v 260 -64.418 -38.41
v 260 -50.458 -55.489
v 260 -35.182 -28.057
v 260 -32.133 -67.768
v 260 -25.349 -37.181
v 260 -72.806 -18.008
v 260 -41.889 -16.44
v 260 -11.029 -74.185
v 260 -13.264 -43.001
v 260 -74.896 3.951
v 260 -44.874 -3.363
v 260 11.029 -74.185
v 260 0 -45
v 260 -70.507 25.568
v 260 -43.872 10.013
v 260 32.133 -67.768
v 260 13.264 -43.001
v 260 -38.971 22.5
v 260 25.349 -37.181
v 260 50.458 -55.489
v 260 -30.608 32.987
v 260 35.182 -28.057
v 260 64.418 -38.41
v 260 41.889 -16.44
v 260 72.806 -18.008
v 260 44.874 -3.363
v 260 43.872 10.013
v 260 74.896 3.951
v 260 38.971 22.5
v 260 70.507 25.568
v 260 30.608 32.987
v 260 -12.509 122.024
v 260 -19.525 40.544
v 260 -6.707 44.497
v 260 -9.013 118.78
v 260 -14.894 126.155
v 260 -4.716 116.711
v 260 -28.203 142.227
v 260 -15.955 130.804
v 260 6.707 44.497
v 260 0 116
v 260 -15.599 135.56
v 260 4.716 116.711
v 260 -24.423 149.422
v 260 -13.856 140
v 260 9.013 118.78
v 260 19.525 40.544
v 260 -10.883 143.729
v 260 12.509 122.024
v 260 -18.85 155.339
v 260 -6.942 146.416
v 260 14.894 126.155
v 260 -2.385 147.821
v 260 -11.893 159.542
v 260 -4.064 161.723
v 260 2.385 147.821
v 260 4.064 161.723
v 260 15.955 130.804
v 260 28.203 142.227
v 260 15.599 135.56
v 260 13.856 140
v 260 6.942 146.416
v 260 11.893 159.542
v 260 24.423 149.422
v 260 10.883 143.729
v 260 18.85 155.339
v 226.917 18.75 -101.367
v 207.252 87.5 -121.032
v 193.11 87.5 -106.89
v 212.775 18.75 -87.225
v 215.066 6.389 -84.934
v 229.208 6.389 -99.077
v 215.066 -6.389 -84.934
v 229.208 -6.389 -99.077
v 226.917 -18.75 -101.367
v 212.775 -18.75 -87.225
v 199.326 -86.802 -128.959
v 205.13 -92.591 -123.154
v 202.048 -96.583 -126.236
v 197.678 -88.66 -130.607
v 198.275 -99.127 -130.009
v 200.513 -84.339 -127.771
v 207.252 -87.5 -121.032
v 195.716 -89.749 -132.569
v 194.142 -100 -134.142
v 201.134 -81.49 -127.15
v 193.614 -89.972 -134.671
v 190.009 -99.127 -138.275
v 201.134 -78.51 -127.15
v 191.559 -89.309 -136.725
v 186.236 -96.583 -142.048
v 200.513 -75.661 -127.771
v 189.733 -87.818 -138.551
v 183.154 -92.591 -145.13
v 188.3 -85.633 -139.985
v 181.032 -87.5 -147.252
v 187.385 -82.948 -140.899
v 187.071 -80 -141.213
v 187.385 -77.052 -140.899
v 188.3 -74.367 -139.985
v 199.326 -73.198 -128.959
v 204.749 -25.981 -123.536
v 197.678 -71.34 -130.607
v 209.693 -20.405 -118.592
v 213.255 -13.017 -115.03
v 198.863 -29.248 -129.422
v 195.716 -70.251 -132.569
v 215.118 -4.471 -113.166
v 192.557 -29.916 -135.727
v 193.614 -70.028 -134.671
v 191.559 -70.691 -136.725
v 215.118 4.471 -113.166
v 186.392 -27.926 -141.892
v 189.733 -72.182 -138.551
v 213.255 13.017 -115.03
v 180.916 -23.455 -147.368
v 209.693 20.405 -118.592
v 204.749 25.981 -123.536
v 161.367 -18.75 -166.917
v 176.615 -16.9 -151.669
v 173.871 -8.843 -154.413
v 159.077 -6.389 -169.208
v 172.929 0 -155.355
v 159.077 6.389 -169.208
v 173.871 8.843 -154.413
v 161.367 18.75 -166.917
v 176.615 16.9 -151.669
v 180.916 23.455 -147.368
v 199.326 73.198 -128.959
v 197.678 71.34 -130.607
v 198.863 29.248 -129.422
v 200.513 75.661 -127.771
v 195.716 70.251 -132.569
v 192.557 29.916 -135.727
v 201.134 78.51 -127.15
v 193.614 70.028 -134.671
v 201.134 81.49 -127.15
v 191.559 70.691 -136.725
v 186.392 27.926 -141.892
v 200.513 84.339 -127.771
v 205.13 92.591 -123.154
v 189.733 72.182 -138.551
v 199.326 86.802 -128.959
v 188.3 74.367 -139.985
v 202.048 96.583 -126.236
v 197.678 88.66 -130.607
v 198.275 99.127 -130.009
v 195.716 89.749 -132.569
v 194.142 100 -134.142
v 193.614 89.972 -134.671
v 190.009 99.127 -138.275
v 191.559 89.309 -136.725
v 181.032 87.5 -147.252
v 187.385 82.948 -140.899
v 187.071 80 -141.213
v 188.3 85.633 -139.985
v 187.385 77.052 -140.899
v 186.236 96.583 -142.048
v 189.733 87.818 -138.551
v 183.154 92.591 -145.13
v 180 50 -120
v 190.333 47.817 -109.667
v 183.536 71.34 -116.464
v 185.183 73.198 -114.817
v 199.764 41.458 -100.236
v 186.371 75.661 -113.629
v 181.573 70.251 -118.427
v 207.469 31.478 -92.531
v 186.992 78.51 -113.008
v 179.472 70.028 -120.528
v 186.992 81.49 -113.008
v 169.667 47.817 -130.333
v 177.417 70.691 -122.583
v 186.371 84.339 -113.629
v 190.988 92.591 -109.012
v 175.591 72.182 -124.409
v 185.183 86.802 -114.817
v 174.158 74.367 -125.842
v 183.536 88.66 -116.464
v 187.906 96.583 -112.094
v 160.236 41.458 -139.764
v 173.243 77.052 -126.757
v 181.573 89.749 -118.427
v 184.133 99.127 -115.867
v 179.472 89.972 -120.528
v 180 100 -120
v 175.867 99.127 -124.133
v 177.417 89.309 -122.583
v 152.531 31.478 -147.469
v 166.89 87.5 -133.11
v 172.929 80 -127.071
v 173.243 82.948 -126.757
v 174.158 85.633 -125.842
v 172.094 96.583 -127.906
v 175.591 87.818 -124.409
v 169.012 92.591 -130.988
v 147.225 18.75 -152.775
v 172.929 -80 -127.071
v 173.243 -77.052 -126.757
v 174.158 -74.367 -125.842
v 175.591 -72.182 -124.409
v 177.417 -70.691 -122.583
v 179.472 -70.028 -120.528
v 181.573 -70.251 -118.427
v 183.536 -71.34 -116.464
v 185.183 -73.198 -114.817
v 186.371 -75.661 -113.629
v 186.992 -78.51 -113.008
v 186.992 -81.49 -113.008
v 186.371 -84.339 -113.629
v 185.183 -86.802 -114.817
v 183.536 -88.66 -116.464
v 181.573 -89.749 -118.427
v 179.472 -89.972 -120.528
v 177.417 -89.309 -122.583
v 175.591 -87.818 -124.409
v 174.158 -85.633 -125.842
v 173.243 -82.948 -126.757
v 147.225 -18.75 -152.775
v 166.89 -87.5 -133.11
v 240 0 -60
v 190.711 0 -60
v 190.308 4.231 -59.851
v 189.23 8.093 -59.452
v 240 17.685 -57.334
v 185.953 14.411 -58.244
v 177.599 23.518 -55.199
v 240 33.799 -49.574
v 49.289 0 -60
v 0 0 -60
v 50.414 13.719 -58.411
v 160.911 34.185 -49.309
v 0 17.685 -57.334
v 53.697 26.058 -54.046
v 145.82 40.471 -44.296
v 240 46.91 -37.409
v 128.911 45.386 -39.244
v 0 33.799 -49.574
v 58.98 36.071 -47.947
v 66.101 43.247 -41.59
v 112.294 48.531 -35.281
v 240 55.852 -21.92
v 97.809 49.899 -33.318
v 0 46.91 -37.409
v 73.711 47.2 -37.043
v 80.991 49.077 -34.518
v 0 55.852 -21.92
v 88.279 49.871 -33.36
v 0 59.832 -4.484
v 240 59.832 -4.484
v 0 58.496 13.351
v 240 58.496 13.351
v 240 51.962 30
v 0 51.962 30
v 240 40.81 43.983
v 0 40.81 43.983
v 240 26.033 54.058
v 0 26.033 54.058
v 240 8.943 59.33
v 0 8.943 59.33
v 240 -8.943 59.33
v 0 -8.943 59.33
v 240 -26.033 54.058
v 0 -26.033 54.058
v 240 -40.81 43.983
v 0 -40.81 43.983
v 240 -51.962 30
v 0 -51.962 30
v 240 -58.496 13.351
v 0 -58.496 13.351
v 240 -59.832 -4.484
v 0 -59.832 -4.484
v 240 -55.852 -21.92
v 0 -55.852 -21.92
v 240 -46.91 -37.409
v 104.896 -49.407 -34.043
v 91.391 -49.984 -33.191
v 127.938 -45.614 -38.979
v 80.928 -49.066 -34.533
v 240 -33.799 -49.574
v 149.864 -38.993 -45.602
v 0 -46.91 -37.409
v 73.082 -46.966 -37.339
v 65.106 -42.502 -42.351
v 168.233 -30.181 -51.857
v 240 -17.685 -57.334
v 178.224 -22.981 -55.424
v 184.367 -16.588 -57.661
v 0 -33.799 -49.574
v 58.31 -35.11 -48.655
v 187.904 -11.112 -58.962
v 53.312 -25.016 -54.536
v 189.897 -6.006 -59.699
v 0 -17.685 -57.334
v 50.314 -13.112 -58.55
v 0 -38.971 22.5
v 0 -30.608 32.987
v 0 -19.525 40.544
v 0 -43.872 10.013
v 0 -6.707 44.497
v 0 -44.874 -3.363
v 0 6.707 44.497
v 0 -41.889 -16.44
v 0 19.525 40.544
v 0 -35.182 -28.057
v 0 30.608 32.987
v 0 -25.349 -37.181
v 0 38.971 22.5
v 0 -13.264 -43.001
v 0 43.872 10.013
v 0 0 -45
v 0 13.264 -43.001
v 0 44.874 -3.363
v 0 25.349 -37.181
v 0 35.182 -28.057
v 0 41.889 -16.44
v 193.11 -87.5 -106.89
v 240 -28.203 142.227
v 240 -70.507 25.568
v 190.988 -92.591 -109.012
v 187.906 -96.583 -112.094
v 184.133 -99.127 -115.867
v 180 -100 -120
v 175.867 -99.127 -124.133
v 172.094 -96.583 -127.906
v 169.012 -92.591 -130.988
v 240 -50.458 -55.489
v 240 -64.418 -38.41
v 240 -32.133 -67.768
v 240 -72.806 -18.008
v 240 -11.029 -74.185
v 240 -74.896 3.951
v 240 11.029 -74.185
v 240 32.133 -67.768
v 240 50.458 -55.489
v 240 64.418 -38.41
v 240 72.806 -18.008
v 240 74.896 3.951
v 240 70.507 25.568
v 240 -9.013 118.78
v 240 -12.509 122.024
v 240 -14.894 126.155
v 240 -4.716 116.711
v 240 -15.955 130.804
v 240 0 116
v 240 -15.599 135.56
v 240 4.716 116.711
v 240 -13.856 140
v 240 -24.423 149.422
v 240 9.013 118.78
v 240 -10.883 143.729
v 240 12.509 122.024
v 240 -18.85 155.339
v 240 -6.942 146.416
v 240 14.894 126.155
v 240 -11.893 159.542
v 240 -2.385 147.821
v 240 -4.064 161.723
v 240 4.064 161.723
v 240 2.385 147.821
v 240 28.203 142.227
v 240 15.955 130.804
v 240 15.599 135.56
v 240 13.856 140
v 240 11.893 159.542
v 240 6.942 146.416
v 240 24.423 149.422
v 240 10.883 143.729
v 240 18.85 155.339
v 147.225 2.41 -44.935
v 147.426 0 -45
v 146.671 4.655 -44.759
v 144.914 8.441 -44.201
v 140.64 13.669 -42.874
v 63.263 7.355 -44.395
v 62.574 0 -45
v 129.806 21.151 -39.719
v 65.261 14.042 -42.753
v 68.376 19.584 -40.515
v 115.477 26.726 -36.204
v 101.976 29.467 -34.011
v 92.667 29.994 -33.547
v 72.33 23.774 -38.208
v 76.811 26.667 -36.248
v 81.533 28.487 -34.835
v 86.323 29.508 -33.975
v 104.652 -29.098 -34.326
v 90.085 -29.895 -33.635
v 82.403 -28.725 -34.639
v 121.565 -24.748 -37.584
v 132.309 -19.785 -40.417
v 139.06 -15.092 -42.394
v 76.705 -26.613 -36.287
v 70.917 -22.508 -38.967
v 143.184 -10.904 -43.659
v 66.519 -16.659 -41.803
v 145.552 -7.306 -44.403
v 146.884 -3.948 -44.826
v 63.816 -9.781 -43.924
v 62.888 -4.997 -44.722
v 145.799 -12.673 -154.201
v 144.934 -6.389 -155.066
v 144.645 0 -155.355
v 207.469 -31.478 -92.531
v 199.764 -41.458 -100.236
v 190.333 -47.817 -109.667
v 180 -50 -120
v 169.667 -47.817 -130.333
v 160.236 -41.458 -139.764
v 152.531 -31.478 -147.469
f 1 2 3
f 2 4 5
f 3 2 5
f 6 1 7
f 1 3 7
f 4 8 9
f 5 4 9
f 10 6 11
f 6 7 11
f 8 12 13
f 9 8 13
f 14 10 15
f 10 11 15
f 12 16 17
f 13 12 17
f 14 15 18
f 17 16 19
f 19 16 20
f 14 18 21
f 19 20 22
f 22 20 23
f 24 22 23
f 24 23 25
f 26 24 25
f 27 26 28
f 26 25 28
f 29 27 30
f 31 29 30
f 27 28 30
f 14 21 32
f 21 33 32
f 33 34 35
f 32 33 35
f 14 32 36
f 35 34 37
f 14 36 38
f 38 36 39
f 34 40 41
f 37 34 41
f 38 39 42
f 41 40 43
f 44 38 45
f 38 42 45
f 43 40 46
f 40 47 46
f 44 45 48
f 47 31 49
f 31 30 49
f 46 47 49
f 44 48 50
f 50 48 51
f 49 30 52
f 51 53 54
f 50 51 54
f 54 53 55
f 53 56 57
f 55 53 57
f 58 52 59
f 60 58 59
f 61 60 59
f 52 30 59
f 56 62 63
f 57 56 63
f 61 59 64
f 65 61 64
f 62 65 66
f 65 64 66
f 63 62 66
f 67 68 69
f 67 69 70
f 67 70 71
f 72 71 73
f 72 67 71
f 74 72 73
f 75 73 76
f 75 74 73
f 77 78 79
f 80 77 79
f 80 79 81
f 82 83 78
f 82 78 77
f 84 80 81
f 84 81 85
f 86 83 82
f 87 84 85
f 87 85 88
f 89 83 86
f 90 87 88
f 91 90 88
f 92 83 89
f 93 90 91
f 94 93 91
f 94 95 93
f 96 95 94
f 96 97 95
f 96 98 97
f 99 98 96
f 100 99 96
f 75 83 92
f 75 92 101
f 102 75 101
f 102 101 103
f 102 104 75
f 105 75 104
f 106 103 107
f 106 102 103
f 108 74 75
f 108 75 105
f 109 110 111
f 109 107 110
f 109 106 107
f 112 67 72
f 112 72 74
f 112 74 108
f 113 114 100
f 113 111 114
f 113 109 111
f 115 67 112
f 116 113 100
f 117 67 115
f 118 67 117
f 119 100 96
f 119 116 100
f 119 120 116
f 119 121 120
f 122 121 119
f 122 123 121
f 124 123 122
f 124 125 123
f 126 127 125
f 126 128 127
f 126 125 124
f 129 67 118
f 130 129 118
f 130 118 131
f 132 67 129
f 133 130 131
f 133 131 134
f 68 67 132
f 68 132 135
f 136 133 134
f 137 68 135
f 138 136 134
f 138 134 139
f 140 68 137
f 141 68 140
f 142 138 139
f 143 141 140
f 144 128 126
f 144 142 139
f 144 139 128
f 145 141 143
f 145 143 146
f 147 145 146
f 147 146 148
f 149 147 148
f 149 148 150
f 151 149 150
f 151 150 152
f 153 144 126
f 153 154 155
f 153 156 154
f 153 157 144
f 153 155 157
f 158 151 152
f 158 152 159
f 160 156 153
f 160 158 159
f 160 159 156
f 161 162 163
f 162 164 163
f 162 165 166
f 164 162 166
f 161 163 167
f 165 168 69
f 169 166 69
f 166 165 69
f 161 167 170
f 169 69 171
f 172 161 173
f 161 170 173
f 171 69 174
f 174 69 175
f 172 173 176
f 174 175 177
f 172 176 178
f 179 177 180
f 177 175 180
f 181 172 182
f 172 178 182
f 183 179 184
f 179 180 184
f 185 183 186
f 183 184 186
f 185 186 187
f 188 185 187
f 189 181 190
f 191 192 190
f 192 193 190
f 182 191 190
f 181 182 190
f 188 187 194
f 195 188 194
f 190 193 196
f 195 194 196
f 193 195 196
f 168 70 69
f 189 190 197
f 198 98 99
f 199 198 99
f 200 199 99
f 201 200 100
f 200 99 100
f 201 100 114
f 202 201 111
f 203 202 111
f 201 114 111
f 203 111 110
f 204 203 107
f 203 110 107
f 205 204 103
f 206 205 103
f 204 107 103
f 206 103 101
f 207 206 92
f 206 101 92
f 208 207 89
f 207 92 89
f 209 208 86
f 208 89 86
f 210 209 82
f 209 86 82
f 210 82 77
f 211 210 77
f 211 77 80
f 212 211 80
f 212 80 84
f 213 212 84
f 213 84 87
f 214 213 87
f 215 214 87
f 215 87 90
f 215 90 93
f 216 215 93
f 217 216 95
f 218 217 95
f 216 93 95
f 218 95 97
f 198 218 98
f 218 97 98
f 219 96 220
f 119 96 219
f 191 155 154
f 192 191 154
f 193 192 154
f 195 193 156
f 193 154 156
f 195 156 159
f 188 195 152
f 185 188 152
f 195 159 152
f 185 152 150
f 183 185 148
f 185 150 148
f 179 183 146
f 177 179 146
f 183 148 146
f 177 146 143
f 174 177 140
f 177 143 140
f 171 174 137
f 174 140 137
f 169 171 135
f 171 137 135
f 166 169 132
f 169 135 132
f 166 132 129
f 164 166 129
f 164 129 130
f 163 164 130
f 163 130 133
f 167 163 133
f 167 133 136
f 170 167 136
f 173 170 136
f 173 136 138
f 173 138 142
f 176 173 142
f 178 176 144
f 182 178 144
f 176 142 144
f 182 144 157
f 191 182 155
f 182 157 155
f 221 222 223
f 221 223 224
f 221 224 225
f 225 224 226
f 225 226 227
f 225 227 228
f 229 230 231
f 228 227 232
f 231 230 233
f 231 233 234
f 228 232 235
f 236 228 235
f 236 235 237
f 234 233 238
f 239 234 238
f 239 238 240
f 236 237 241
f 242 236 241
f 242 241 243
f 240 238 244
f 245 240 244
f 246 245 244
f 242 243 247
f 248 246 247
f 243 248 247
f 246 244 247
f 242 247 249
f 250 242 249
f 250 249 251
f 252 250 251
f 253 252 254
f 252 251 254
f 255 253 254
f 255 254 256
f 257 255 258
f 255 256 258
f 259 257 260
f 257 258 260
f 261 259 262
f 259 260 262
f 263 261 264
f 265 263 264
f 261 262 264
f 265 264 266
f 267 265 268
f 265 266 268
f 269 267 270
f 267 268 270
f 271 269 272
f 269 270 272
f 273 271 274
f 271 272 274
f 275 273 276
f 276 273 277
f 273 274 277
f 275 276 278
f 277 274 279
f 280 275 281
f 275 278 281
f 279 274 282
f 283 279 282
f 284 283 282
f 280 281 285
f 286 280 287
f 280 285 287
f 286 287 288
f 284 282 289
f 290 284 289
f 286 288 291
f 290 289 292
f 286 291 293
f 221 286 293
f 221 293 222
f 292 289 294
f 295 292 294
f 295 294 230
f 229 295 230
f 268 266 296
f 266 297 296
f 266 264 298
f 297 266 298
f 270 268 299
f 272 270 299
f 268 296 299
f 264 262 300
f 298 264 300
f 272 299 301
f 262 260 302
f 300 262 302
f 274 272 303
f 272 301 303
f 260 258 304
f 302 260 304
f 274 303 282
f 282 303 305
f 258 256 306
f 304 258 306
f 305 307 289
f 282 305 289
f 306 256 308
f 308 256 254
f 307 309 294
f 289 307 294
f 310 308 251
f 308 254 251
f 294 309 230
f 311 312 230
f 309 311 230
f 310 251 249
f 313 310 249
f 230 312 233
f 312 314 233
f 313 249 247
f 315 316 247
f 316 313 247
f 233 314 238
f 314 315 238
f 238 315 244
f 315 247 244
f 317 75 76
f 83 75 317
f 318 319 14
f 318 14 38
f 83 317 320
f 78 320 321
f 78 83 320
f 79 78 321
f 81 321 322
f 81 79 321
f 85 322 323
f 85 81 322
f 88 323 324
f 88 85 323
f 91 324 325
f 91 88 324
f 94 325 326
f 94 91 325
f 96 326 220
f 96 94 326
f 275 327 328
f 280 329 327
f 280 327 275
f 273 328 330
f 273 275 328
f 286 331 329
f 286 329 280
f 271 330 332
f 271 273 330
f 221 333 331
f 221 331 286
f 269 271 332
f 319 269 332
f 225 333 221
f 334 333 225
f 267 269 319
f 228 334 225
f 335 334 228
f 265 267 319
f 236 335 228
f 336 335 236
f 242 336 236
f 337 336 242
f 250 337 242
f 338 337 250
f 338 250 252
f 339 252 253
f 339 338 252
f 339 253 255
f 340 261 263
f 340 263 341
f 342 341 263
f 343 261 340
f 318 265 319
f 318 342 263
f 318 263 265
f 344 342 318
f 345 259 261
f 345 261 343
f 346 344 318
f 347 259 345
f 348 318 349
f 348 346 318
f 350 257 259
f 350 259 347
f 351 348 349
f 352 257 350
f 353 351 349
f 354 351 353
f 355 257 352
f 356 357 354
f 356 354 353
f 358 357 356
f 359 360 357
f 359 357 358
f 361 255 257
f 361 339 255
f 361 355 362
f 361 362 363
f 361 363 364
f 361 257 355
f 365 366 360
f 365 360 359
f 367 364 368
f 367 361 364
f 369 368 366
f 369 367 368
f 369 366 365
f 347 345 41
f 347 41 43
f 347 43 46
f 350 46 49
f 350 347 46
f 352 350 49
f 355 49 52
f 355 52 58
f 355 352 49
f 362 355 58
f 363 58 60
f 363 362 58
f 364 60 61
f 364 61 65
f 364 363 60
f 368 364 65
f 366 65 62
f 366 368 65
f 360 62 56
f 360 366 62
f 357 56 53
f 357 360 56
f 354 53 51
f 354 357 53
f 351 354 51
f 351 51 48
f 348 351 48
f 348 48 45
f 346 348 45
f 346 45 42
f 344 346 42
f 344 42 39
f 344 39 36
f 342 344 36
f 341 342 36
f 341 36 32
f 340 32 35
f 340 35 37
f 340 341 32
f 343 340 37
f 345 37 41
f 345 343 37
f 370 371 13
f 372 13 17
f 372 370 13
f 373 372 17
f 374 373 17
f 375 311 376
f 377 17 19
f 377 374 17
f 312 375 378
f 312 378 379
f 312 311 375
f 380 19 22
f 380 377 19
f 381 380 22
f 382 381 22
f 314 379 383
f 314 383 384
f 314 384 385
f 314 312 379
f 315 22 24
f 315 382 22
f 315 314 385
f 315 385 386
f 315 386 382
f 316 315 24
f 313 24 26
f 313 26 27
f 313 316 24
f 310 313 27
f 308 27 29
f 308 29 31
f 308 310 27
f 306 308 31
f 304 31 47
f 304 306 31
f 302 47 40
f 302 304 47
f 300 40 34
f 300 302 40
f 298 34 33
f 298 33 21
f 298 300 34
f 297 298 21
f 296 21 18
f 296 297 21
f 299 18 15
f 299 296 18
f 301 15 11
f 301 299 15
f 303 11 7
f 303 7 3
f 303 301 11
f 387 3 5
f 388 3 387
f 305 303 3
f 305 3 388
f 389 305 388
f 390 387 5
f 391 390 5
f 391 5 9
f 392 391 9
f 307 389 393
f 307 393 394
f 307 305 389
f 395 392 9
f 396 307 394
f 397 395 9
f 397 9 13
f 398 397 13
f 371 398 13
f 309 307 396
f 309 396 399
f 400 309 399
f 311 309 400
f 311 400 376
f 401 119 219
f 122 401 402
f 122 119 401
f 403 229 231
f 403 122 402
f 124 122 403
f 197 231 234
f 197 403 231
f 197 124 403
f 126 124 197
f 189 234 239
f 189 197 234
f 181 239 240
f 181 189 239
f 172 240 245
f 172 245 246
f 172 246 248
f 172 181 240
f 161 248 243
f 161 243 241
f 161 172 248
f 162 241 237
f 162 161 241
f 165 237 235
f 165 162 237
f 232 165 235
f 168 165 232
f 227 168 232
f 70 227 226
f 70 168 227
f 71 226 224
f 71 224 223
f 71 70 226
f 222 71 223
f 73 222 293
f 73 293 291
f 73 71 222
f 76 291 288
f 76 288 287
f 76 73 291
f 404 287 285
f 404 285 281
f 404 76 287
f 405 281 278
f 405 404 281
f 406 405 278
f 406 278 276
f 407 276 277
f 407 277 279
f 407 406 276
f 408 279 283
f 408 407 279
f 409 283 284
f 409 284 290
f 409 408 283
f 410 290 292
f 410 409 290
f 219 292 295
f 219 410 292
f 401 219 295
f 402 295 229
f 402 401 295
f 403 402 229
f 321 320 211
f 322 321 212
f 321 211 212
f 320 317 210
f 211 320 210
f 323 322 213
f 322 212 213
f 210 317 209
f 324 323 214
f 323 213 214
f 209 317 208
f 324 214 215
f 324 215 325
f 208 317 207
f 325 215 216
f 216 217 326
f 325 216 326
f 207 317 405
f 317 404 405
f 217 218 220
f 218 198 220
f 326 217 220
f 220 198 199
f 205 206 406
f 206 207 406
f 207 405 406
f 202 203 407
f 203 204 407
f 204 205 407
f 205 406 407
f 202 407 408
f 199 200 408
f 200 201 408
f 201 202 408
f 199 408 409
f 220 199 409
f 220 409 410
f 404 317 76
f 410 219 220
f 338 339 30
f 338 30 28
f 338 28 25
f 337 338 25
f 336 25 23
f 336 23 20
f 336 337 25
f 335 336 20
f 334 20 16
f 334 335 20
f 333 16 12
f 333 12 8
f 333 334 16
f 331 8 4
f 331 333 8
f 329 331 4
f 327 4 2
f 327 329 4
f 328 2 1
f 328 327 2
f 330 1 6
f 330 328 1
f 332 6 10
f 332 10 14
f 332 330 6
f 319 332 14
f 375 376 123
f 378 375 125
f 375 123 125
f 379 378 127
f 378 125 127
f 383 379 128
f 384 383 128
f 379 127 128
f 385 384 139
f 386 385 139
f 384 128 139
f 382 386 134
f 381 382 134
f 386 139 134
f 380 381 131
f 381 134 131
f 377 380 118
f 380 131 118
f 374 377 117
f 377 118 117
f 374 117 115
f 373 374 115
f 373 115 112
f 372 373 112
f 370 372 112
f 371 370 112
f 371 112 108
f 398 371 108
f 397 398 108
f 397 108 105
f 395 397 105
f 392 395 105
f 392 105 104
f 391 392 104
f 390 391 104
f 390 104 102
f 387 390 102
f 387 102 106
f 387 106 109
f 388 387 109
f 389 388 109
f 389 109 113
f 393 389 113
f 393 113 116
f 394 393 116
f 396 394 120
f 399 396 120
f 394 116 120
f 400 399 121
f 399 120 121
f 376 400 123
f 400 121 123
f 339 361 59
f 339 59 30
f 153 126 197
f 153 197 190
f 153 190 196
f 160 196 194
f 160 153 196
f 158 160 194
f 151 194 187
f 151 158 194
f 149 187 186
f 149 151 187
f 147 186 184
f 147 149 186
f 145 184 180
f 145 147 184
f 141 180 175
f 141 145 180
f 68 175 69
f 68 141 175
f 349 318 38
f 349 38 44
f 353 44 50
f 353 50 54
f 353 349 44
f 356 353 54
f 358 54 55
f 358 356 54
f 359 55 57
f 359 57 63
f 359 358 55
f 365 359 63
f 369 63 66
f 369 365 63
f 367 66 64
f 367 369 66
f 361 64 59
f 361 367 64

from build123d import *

# Parameters (mm, degrees)
SKETCH_1_R           = 60
SKETCH_1_R_2         = 45
EXTRUDE_1_DEPTH      = 240
SKETCH_2_R           = 45
SKETCH_2_R_2         = 16
EXTRUDE_2_DEPTH      = 20
EXTRUDE_4_REACH      = 356.216
EXTRUDE_4_END_RADIUS = 60
SKETCH_15_R          = 50
SKETCH_15_R_2        = 30
CUT_EXTRUDE_1_REACH  = 356.216
SKETCH_18_R          = 30
EXTRUDE_START        = 20
SKETCH_19_R          = 30
SKETCH_19_R_2        = 10
EXTRUDE_6_DEPTH      = 20


with BuildPart() as part:
    # 草图1 → 凸台-拉伸1 (new body)
    with BuildSketch(Plane(origin=(0, 0, 0), x_dir=(0, 0, -1), z_dir=(1, 0, 0))):
        Circle(SKETCH_1_R)
        Circle(SKETCH_1_R_2, mode=Mode.SUBTRACT)
    extrude(amount=EXTRUDE_1_DEPTH)

    # 草图2 → 凸台-拉伸2 (add)
    with BuildSketch(Plane(origin=(240, 0, 0), x_dir=(0, 0, -1), z_dir=(1, 0, 0))):
        with BuildLine():
            Line((-142.227272727, 28.202888018), (-25.568181818, 70.507220045))
            ThreePointArc((-25.568181818, 70.507220045), (75, 0), (-25.568181818, -70.507220045))
            Line((-25.568181818, -70.507220045), (-142.227272727, -28.202888018))
            ThreePointArc((-142.227272727, -28.202888018), (-162, 0), (-142.227272727, 28.202888018))
        make_face()
        Circle(SKETCH_2_R, mode=Mode.SUBTRACT)
        with Locations((-132, 0)):
            Circle(SKETCH_2_R_2, mode=Mode.SUBTRACT)
    extrude(amount=EXTRUDE_2_DEPTH)

    # 凸台-拉伸4: up to this cylinder (the profile starts outside it)
    extrude_4_end = Plane(origin=(214.355339, 0, 0), z_dir=(-1, 0, 0)) * Cylinder(EXTRUDE_4_END_RADIUS, 833.432, mode=Mode.PRIVATE)
    # 草图15 → 凸台-拉伸4 (add, up to the surface)
    with BuildSketch(Plane(origin=(150, 0, -150), x_dir=(-0.7071067811865465, 2.3800392787790966e-15, -0.7071067811865487), z_dir=(0.7071067811865487, -2.3800392787791053e-15, -0.7071067811865465)), mode=Mode.PRIVATE) as extrude_4_sk1:
        with Locations((-42.426406871, 0)):
            Circle(SKETCH_15_R)
        with Locations((-42.426406871, 0)):
            Circle(SKETCH_15_R_2, mode=Mode.SUBTRACT)
    extrude_4_tool1 = extrude(extrude_4_sk1.sketch, amount=-EXTRUDE_4_REACH, mode=Mode.PRIVATE) - extrude_4_end
    add(extrude_4_tool1.solids().sort_by_distance((214.355339, 0, -85.644661))[0])

    # 草图18 → 切除-拉伸1 (cut, up to next)
    with BuildSketch(Plane(origin=(150, 0, -150), x_dir=(-0.7071067811865465, 2.3800392787790978e-15, -0.7071067811865486), z_dir=(0.7071067811865486, -2.380039278779105e-15, -0.7071067811865465)), mode=Mode.PRIVATE) as cut_extrude_1_sk1:
        with Locations((-42.426406871, 0)):
            Circle(SKETCH_18_R)
    cut_extrude_1_tool1 = extrude(cut_extrude_1_sk1.sketch, amount=-CUT_EXTRUDE_1_REACH, mode=Mode.PRIVATE) & part.part
    add(cut_extrude_1_tool1.solids().sort_by_distance((180, 0, -120))[0], mode=Mode.SUBTRACT)

    # 草图19 → 凸台-拉伸6 (add)
    with BuildSketch(Plane(origin=(150, 0, -150), x_dir=(-0.7071067811865465, 2.3800392787790978e-15, -0.7071067811865486), z_dir=(0.7071067811865486, -2.380039278779105e-15, -0.7071067811865465)).offset(EXTRUDE_START)):
        with BuildLine():
            Line((-60.966903089, 87.5), (-88.777647416, 18.75))
            ThreePointArc((-88.777647416, 18.75), (-92.426406871, 0), (-88.777647416, -18.75))
            Line((-88.777647416, -18.75), (-60.966903089, -87.5))
            ThreePointArc((-60.966903089, -87.5), (-42.426406871, -100), (-23.885910653, -87.5))
            Line((-23.885910653, -87.5), (3.924833673, -18.75))
            ThreePointArc((3.924833673, -18.75), (7.573593129, 0), (3.924833673, 18.75))
            Line((3.924833673, 18.75), (-23.885910653, 87.5))
            ThreePointArc((-23.885910653, 87.5), (-42.426406871, 100), (-60.966903089, 87.5))
        make_face()
        with Locations((-42.426406871, 0)):
            Circle(SKETCH_19_R, mode=Mode.SUBTRACT)
        with Locations((-42.426406871, 80)):
            Circle(SKETCH_19_R_2, mode=Mode.SUBTRACT)
        with Locations((-42.426406871, -80)):
            Circle(SKETCH_19_R_2, mode=Mode.SUBTRACT)
    extrude(amount=-EXTRUDE_6_DEPTH)


solid = part.part
